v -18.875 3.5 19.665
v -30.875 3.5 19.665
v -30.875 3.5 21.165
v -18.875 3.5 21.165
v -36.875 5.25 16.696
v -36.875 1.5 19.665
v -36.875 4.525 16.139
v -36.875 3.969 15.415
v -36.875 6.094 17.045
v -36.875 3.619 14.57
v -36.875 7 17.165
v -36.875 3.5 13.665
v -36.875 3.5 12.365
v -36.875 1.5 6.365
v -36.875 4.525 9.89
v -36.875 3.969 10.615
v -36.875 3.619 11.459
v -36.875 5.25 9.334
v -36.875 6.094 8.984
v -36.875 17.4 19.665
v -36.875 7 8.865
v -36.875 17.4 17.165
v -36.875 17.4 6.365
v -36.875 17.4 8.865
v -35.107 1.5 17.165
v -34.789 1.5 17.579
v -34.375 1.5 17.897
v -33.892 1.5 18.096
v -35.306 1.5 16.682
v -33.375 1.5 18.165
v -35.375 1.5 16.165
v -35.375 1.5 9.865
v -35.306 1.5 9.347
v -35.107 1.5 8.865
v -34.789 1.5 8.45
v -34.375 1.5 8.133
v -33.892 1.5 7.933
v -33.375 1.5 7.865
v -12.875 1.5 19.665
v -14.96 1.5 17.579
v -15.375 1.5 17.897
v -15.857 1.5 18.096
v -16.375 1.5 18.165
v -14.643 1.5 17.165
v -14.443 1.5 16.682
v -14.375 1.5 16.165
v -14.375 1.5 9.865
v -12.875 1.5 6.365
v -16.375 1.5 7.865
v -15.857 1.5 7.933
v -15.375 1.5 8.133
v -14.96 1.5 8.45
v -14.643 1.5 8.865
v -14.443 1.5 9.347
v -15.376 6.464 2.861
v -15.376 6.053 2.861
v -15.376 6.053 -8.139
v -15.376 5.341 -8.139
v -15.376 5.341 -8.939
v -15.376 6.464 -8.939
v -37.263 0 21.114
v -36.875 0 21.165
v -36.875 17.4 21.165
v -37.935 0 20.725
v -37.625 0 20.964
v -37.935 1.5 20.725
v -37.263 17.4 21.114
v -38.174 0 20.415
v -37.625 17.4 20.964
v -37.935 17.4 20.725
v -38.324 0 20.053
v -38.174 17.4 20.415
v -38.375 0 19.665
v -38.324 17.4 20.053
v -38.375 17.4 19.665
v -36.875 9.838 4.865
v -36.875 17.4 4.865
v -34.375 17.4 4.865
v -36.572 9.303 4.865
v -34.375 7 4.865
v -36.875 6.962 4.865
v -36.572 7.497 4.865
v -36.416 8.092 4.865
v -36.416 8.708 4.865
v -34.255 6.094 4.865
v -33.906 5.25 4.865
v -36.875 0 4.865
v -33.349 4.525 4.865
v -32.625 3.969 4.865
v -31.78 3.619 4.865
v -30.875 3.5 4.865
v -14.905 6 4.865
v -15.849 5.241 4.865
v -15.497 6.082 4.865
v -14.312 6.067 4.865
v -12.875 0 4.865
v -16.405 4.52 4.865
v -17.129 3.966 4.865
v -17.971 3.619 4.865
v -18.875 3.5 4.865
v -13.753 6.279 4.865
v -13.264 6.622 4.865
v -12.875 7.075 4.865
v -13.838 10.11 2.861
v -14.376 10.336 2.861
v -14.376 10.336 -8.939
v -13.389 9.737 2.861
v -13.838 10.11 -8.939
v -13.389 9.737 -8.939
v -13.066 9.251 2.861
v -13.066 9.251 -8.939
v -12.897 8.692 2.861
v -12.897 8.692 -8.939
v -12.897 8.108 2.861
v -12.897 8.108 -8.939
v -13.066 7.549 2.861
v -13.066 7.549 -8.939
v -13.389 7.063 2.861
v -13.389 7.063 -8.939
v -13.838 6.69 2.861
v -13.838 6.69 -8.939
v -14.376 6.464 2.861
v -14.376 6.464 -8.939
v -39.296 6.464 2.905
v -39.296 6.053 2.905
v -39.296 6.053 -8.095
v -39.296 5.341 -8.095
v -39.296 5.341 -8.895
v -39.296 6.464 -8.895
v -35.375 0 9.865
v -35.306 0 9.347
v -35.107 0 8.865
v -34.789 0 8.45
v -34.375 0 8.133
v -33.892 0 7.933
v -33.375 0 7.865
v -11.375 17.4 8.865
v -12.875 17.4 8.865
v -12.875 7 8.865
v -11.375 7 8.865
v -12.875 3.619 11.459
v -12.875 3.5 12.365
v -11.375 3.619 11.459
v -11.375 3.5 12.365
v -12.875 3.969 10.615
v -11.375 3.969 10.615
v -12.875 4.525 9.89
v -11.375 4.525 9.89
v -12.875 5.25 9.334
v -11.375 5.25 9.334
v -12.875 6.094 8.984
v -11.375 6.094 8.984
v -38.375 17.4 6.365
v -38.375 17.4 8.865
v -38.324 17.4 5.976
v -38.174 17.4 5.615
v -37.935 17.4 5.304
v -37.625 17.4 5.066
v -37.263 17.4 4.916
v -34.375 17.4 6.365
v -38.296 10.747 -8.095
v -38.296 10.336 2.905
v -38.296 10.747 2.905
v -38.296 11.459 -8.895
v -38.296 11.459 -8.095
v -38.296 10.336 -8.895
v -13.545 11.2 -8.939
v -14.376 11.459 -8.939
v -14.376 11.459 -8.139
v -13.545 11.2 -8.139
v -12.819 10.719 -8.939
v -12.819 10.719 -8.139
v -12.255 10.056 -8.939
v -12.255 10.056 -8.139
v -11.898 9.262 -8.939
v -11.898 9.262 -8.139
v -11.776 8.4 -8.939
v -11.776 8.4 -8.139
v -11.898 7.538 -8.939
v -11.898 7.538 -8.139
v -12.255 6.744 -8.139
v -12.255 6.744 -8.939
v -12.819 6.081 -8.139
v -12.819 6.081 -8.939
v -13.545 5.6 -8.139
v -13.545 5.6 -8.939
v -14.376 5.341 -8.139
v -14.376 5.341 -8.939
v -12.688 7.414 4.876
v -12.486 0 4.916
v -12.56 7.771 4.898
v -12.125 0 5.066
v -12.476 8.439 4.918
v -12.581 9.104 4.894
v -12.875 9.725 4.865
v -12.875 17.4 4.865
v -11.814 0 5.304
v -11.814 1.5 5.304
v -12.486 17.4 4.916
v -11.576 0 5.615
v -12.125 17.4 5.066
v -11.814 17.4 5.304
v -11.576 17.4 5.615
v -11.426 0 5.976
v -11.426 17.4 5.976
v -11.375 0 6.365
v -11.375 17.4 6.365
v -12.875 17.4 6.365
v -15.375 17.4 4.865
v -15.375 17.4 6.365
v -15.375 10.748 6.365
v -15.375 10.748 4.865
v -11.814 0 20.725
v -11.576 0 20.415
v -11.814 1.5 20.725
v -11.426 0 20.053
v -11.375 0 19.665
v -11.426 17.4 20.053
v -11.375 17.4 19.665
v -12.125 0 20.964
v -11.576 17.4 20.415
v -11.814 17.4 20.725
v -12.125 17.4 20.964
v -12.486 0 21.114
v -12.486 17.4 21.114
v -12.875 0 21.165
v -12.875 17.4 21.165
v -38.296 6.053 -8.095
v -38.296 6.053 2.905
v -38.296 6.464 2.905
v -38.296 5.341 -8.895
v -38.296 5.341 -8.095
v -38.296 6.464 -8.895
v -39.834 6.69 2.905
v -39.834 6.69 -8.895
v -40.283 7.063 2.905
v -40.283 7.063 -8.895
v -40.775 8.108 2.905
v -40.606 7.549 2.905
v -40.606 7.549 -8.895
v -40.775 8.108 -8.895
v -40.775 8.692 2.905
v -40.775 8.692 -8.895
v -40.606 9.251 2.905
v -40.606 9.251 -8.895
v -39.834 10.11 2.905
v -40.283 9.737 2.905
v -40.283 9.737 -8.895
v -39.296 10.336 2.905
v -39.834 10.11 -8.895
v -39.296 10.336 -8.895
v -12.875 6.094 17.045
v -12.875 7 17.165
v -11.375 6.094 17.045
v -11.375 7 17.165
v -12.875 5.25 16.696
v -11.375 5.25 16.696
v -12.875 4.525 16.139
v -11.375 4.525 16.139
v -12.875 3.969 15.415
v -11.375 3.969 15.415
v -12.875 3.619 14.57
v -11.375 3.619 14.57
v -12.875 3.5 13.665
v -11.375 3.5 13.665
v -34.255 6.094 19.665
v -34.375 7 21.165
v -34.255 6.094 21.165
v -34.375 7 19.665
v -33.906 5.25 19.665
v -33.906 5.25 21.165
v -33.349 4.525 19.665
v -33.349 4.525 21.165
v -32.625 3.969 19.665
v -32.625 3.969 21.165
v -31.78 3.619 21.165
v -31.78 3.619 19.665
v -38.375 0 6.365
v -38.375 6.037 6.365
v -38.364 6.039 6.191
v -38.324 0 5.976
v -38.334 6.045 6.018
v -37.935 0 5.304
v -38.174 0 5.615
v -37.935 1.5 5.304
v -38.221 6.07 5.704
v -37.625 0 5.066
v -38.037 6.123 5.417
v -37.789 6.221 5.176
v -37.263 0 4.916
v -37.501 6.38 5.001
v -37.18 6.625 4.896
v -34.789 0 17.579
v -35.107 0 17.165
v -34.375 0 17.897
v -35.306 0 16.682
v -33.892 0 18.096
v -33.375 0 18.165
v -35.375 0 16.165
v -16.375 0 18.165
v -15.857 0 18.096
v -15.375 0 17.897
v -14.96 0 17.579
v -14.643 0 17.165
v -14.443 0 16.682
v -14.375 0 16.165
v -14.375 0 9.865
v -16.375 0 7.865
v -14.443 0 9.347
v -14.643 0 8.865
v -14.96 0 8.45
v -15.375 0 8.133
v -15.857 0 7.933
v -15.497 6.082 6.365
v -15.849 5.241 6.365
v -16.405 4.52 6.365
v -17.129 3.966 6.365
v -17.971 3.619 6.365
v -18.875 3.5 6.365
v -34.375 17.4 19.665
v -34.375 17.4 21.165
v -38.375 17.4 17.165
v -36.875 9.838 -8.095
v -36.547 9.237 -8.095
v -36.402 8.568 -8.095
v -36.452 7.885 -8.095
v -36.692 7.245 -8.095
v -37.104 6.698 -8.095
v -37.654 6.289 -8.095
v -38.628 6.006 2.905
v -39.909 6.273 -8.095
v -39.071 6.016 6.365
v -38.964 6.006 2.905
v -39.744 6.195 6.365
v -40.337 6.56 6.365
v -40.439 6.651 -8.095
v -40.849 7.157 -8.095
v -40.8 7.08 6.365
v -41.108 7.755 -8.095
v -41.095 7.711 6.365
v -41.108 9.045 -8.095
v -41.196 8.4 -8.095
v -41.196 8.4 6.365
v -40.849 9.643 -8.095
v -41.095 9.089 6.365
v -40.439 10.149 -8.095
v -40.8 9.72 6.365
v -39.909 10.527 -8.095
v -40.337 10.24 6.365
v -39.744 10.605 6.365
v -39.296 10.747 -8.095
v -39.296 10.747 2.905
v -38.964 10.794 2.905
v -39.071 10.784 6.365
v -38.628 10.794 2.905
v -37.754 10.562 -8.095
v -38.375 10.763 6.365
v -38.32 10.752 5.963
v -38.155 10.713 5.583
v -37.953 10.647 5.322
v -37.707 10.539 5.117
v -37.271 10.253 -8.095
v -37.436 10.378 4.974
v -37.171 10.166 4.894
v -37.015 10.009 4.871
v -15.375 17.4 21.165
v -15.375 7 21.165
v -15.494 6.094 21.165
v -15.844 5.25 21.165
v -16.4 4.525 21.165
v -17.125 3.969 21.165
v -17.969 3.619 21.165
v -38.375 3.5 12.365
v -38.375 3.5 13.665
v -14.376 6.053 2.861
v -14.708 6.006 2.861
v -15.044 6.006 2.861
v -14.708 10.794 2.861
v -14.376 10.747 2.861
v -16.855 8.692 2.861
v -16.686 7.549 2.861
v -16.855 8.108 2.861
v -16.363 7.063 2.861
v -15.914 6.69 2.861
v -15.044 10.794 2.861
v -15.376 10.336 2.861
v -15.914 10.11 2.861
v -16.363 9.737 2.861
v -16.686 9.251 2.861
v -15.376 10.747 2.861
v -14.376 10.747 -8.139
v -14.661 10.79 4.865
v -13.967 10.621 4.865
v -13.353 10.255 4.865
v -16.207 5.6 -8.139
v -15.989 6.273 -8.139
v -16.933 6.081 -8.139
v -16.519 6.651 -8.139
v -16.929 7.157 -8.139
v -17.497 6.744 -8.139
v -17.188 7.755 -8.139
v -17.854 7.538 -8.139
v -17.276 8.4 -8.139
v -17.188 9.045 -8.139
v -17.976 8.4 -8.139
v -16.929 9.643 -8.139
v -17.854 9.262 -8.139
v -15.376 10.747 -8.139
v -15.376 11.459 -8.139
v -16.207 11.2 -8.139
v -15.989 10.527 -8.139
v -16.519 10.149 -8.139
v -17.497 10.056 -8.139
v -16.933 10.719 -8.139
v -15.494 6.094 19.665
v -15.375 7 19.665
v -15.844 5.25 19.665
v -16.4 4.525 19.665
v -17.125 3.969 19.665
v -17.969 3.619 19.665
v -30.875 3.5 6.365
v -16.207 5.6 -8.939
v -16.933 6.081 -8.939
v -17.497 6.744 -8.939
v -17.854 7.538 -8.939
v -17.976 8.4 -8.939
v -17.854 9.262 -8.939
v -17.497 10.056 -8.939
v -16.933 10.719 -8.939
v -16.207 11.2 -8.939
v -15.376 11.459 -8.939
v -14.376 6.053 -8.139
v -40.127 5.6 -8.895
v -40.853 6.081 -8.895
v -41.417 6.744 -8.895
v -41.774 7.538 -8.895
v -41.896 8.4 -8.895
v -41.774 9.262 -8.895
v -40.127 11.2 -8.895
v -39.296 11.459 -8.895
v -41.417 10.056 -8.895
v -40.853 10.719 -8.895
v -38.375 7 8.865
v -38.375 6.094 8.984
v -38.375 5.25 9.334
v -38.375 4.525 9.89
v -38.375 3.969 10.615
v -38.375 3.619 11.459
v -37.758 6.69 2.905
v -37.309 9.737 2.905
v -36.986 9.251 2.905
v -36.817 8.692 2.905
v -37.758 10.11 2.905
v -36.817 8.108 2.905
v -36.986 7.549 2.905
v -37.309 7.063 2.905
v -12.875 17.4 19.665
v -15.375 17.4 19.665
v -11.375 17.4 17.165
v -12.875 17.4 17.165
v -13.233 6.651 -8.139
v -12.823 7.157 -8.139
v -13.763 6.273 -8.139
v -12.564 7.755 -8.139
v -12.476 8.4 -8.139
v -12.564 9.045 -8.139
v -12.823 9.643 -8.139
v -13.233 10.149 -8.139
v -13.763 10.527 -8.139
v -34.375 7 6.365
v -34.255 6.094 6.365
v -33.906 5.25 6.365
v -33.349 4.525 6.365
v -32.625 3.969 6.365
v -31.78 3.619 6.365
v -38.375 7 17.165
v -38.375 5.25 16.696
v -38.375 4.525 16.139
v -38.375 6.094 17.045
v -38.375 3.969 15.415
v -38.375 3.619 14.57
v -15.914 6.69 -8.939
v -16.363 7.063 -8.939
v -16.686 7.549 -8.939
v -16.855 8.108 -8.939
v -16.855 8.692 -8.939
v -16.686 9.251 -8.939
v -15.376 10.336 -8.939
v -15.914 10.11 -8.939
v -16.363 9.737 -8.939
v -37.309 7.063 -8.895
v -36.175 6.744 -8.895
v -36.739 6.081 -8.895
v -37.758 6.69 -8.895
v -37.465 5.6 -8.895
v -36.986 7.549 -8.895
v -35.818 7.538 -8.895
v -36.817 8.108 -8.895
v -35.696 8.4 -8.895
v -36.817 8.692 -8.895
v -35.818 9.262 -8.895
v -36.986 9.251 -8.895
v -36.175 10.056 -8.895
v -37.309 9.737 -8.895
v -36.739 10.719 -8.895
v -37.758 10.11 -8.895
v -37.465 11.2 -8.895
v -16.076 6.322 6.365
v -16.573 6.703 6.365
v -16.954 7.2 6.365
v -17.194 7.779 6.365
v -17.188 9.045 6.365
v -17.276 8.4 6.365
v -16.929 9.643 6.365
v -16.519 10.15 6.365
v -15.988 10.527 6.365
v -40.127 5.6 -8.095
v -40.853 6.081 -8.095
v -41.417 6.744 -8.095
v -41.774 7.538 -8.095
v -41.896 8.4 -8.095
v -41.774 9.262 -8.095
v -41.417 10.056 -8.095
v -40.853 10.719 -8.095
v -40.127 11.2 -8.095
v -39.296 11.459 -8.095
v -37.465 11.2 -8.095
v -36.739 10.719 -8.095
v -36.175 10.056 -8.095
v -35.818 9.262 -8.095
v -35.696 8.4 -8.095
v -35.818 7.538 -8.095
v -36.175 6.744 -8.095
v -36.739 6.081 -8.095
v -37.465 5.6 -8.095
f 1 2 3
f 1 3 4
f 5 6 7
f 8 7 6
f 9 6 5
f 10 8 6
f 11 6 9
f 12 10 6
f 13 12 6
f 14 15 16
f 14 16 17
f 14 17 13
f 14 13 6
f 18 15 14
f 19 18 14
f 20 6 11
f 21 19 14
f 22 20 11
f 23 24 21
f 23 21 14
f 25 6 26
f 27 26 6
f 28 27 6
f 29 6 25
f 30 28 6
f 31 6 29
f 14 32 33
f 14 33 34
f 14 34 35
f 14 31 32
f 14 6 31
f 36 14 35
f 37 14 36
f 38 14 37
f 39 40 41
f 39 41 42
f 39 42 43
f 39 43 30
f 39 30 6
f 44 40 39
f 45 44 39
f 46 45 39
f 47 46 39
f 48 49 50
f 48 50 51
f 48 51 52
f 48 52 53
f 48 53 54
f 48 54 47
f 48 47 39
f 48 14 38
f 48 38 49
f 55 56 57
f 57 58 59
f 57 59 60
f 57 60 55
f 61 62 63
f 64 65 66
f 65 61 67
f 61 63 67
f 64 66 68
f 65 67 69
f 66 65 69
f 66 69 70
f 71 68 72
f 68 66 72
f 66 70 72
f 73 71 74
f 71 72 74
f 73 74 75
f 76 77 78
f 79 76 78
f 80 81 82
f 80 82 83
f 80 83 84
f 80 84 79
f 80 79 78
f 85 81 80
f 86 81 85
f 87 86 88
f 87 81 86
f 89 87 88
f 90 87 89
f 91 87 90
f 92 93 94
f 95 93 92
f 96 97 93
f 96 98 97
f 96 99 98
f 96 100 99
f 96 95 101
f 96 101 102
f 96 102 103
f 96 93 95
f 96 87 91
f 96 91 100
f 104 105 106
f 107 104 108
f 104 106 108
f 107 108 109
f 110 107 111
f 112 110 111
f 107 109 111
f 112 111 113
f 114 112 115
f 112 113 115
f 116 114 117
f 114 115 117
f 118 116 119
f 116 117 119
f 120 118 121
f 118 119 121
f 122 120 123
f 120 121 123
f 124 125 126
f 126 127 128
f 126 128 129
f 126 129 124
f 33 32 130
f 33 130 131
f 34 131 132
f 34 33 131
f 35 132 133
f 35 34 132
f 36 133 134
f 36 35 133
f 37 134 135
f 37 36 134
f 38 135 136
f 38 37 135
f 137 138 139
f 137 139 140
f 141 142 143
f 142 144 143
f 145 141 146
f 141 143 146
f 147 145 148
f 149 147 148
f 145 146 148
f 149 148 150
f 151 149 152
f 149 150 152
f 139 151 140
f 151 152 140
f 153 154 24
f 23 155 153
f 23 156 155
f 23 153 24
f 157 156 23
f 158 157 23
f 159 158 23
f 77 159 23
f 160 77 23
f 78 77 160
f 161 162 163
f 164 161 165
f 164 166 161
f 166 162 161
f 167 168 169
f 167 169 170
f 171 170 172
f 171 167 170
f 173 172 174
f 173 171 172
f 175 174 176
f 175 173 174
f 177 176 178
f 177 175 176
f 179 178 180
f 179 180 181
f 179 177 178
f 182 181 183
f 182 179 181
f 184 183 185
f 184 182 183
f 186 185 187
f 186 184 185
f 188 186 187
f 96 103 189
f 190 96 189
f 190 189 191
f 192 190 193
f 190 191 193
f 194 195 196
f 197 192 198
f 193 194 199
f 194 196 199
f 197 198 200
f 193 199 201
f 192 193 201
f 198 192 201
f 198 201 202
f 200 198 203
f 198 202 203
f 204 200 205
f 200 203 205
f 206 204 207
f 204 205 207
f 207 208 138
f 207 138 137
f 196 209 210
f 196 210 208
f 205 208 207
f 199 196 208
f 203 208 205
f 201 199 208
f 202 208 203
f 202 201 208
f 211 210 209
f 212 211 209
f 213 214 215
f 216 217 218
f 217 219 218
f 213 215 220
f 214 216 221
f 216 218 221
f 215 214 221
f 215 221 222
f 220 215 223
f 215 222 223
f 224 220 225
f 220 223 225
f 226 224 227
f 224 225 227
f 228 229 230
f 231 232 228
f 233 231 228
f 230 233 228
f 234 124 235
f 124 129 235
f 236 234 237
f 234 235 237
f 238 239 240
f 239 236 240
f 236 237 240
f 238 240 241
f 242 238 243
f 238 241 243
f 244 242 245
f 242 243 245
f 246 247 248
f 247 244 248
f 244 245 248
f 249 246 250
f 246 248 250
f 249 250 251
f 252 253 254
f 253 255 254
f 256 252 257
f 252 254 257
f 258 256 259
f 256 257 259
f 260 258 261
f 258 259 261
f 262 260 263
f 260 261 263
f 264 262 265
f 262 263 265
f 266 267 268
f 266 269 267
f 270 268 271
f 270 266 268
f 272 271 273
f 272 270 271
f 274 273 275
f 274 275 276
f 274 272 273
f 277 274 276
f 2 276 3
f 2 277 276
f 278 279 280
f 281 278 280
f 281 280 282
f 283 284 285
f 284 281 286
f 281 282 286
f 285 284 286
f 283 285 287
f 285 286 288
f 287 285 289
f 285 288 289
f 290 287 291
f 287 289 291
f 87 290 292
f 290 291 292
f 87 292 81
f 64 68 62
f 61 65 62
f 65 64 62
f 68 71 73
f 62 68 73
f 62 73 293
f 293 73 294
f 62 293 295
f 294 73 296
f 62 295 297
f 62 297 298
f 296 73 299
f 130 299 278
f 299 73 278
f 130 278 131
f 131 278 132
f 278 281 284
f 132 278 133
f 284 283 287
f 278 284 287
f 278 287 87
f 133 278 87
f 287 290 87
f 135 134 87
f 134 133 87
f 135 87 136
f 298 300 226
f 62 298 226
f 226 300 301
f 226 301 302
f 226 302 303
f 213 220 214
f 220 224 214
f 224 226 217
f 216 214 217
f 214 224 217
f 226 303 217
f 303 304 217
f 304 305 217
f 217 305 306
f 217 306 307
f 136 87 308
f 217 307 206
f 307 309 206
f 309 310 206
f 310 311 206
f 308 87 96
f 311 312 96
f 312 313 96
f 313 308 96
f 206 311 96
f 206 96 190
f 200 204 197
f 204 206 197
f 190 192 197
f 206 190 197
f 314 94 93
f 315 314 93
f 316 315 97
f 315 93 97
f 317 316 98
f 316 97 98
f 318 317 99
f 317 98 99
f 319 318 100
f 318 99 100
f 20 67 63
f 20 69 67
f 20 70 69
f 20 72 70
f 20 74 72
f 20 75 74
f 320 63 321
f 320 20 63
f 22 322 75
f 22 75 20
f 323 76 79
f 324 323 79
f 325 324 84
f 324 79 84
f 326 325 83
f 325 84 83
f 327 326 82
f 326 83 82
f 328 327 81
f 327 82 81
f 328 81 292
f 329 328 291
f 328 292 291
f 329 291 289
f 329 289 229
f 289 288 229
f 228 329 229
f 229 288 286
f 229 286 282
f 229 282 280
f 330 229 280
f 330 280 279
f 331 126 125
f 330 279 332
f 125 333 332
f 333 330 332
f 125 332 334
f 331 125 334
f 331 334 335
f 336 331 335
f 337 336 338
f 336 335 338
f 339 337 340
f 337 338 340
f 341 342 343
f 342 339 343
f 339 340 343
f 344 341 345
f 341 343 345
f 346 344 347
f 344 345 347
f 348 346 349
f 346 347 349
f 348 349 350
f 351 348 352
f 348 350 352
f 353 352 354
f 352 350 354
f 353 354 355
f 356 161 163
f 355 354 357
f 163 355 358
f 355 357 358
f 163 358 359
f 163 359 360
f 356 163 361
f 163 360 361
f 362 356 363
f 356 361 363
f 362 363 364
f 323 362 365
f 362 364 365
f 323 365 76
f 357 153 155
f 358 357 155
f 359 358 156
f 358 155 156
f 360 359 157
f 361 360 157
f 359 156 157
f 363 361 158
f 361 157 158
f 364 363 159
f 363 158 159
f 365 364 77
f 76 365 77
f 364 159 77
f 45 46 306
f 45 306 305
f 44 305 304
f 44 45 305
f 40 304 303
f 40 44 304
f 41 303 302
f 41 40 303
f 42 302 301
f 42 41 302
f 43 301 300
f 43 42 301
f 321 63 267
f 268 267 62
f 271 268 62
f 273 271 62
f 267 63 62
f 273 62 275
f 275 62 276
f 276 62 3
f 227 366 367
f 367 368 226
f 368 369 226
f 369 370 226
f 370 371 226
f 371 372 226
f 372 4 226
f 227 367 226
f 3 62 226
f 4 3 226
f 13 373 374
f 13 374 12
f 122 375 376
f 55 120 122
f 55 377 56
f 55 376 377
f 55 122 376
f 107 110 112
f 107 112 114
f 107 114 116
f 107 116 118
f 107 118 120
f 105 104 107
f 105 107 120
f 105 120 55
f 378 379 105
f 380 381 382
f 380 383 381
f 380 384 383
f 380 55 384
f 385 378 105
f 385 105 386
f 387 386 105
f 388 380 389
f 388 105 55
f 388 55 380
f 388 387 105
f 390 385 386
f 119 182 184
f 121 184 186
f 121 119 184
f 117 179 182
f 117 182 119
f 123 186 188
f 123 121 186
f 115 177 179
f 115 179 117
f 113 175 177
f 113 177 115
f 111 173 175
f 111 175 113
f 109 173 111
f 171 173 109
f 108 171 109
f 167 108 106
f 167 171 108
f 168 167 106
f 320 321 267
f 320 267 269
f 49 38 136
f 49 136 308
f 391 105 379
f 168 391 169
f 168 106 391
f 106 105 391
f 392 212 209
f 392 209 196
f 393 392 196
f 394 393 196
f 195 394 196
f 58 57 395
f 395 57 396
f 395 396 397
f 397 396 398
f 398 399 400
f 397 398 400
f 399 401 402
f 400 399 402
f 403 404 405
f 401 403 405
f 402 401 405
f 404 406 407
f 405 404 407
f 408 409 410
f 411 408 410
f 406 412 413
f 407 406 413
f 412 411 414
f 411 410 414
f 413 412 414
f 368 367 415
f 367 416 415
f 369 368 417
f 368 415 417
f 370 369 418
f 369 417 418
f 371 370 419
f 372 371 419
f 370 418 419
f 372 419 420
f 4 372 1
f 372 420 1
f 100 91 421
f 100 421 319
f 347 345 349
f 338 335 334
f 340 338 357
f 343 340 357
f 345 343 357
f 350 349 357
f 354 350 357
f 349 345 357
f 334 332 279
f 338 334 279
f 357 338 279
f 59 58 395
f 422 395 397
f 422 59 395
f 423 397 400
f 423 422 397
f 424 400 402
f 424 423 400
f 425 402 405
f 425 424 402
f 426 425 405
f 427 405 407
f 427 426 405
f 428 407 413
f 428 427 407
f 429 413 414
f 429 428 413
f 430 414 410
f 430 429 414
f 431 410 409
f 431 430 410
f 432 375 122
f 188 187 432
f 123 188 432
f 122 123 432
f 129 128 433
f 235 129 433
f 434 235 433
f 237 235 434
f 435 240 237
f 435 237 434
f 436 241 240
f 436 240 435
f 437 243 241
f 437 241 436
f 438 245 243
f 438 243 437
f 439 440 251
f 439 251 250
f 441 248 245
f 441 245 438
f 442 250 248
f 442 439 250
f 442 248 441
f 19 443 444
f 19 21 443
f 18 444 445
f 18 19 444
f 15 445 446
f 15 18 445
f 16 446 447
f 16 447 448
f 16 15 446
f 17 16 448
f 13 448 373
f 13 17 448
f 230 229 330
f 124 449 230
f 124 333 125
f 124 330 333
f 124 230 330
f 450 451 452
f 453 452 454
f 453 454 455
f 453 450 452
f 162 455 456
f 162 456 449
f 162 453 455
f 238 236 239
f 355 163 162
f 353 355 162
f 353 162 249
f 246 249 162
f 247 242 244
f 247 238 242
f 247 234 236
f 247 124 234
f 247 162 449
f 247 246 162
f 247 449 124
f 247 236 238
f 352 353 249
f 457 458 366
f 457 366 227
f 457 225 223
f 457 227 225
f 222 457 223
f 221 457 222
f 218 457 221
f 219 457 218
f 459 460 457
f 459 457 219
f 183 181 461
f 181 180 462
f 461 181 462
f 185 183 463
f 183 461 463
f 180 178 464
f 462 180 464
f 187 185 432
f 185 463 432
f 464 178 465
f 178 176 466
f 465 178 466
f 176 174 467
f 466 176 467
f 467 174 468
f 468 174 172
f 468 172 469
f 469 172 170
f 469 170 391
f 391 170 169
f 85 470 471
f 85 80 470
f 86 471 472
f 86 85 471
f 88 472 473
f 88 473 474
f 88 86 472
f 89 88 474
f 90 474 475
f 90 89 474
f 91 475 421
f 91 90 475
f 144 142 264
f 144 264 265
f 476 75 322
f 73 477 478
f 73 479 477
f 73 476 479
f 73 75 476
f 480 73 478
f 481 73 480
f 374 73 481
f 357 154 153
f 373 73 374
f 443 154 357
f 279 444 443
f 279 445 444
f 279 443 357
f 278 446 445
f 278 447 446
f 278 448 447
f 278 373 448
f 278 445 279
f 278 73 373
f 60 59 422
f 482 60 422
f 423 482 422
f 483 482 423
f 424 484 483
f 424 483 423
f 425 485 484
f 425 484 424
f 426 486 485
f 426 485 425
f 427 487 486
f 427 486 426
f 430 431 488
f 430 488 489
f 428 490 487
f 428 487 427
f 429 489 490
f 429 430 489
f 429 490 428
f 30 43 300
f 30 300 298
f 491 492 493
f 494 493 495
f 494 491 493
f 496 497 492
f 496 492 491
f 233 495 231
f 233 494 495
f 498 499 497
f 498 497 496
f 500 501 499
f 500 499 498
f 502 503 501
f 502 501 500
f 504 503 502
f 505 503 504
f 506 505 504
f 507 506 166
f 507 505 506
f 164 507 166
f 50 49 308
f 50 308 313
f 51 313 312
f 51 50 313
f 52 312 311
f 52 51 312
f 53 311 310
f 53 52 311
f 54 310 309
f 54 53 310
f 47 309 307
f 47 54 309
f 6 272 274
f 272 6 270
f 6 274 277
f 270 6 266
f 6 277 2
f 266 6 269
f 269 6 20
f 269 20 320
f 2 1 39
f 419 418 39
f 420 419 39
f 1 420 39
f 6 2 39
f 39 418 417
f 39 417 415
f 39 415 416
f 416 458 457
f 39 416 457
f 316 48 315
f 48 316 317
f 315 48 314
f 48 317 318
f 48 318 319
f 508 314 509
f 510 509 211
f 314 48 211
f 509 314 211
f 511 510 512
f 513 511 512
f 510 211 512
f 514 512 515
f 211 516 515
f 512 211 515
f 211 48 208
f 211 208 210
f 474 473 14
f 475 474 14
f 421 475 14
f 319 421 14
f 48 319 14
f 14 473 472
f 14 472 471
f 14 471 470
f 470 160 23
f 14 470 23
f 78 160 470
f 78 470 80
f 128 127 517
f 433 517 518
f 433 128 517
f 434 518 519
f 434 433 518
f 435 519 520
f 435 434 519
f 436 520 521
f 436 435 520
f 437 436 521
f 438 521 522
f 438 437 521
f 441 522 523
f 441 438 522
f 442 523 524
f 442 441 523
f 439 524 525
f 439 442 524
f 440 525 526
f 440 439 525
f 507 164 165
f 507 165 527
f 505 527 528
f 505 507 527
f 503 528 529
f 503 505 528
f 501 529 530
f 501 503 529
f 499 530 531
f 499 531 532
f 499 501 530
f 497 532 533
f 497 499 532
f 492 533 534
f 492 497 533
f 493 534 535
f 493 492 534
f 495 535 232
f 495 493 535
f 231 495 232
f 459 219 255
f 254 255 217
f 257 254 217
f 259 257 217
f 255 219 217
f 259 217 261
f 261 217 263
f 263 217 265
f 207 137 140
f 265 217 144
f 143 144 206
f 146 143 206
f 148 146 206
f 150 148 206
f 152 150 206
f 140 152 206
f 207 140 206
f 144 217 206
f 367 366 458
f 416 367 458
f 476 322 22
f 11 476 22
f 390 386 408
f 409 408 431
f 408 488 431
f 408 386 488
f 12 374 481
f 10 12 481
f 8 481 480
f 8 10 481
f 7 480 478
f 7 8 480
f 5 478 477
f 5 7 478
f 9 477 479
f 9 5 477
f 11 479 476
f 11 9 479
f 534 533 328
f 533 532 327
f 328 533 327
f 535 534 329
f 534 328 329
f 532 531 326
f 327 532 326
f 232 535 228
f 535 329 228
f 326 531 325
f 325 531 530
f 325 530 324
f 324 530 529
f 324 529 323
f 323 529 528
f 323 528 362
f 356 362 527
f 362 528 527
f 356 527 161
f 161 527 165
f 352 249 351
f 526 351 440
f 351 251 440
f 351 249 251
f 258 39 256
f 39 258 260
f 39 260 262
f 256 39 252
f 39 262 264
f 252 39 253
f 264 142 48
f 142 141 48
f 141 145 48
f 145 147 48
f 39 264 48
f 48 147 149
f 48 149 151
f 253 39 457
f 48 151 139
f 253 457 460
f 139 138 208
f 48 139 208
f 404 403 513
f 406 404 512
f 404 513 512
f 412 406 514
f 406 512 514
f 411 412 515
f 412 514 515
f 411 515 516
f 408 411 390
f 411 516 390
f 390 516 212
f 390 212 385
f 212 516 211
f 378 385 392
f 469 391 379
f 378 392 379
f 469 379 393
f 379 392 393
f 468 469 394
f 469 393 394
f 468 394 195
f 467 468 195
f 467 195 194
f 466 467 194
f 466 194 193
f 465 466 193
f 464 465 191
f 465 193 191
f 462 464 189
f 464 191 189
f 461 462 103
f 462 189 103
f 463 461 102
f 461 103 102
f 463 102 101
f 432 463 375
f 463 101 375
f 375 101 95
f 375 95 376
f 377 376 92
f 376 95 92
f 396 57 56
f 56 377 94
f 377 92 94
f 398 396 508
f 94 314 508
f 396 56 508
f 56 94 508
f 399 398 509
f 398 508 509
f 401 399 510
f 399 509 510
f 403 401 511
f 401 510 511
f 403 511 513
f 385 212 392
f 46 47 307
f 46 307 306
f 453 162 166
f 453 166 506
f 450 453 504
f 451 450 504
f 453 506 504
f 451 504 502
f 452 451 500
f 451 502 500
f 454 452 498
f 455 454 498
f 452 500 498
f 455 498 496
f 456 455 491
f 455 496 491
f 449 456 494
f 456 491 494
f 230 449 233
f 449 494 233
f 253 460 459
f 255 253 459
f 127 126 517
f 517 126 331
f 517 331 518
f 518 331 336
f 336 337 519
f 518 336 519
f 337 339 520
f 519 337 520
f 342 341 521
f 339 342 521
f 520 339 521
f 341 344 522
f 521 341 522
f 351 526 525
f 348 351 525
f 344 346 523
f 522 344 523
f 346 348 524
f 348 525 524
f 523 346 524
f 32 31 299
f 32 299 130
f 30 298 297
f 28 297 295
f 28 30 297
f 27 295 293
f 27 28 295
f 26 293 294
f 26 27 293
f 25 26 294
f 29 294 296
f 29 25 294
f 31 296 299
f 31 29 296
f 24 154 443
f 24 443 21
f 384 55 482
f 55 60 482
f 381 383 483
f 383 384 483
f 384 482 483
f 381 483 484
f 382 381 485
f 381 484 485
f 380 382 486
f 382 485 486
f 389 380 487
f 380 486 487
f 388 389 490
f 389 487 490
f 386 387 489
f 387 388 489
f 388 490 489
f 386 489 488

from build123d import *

# Parameters (mm, degrees)
SKETCH1_W                = 27
SKETCH1_H                = 16.3
BOSS_EXTRUDE1_DEPTH      = 17.4
SKETCH2_W                = 24
SKETCH2_H                = 13.3
CUT_EXTRUDE1_DEPTH       = 15.9
SKETCH3_W                = 19
SKETCH3_H                = 16.3
CUT_EXTRUDE2_DEPTH       = 13.9
SKETCH4_W                = 27
SKETCH4_H                = 8.3
CUT_EXTRUDE3_DEPTH       = 13.9
SKETCH6_R                = 3.69
BOSS_EXTRUDE2_DEPTH      = 2.38
SKETCH7_R                = 3.1
CUT_EXTRUDE4_DEPTH       = 0.8
SKETCH8_R                = 2.4
CUT_EXTRUDE5_DEPTH       = 4.8
CUT_EXTRUDE7_START       = -0.8
SKETCH9_R                = 3.1
CUT_EXTRUDE7_DEPTH       = 0.8
CUT_EXTRUDE8_DEPTH       = 10
FILLET1_R                = 3.5
FILLET2_R                = 3.5
FILLET3_R                = 3.5
FILLET4_R                = 3.5
FILLET5_R                = 3.5
FILLET6_R                = 3.5
FILLET7_R                = 3.5
FILLET8_R                = 3.5
FILLET9_R                = 1.5
FILLET10_R               = 1.5
FILLET11_R               = 1.5
FILLET12_R               = 1.5
SKETCH11_W               = 20
SKETCH11_H               = 4.569127273
CUT_EXTRUDE10_DEPTH      = 35
SKETCH12_W               = 26.121320344
SKETCH12_H               = 15.421320343
BOSS_EXTRUDE3_DEPTH      = 1.5
BOSS_EXTRUDE4_DEPTH      = 13.76
BOSS_EXTRUDE4_DEPTH_BACK = 1.5
SKETCH14_R               = 2.4
SKETCH15_R               = 3.1
BOSS_EXTRUDE6_DEPTH      = 0.8
SKETCH17_R               = 2
CUT_EXTRUDE11_DEPTH      = 11.8
SKETCH18_W               = 1
SKETCH18_H               = 8
CUT_EXTRUDE12_DEPTH      = 11.8
BOSS_EXTRUDE7_DEPTH      = 13.803772877
BOSS_EXTRUDE7_DEPTH_BACK = 1.5
SKETCH19_R               = 2.4
SKETCH20_R               = 3.1
BOSS_EXTRUDE8_DEPTH      = 0.8
SKETCH21_R               = 2
CUT_EXTRUDE13_DEPTH      = 11.8
SKETCH22_W               = 1
SKETCH22_H               = 7.748272369
CUT_EXTRUDE14_DEPTH      = 11.8
CUT_EXTRUDE15_DEPTH      = 11.8


with BuildPart() as part:
    # Sketch1 → Boss-Extrude1 (new body)
    with BuildSketch(Plane(origin=(0, 0, 0), x_dir=(1, 0, 0), z_dir=(0, 1, 0))):
        with Locations((-24.874612789, -13.014611924)):
            Rectangle(SKETCH1_W, SKETCH1_H)
    extrude(amount=BOSS_EXTRUDE1_DEPTH)

    # Sketch2 → Cut-Extrude1 (cut)
    with BuildSketch(Plane(origin=(0, 17.4, 0), x_dir=(1, 0, 0), z_dir=(0, 1, 0))):
        with Locations((-24.874612789, -13.014611924)):
            Rectangle(SKETCH2_W, SKETCH2_H)
    extrude(amount=-CUT_EXTRUDE1_DEPTH, mode=Mode.SUBTRACT)

    # Sketch3 → Cut-Extrude2 (cut)
    with BuildSketch(Plane(origin=(0, 17.4, 0), x_dir=(1, 0, 0), z_dir=(0, 1, 0))):
        with Locations((-24.874612789, -13.014611924)):
            Rectangle(SKETCH3_W, SKETCH3_H)
    extrude(amount=-CUT_EXTRUDE2_DEPTH, mode=Mode.SUBTRACT)

    # Sketch4 → Cut-Extrude3 (cut)
    with BuildSketch(Plane(origin=(0, 17.4, 0), x_dir=(1, 0, 0), z_dir=(0, 1, 0))):
        with Locations((-24.874612789, -13.014611924)):
            Rectangle(SKETCH4_W, SKETCH4_H)
    extrude(amount=-CUT_EXTRUDE3_DEPTH, mode=Mode.SUBTRACT)

    # Sketch6 → Boss-Extrude2 (add)
    with BuildSketch(Plane(origin=(0, 0, 0), x_dir=(-1, 0, 0), z_dir=(0, -1, 0))):
        with Locations(Location((32.844612789, -9.029611924, 0), (0, 0, 90))):
            Circle(SKETCH6_R)
        with Locations(Location((32.844612789, -16.999611924, 0), (0, 0, 90))):
            Circle(SKETCH6_R)
        with Locations(Location((16.904612789, -9.029611924, 0), (0, 0, 90))):
            Circle(SKETCH6_R)
        with Locations(Location((16.904612789, -16.999611924, 0), (0, 0, 90))):
            Circle(SKETCH6_R)
    extrude(amount=BOSS_EXTRUDE2_DEPTH)

    # Sketch7 → Cut-Extrude4 (cut)
    with BuildSketch(Plane(origin=(0, -2.38, 0), x_dir=(-1, 0, 0), z_dir=(0, -1, 0))):
        with Locations(Location((32.844612789, -9.029611924, 0), (0, 0, 90))):
            Circle(SKETCH7_R)
        with Locations(Location((32.844612789, -16.999611924, 0), (0, 0, 90))):
            Circle(SKETCH7_R)
        with Locations(Location((16.904612789, -16.999611924, 0), (0, 0, 90))):
            Circle(SKETCH7_R)
        with Locations(Location((16.904612789, -9.029611924, 0), (0, 0, 90))):
            Circle(SKETCH7_R)
    extrude(amount=-CUT_EXTRUDE4_DEPTH, mode=Mode.SUBTRACT)

    # Sketch8 → Cut-Extrude5 (cut)
    with BuildSketch(Plane(origin=(0, -1.58, 0), x_dir=(-1, 0, 0), z_dir=(0, -1, 0))):
        with Locations(Location((32.844612789, -9.029611924, 0), (0, 0, 90))):
            Circle(SKETCH8_R)
        with Locations(Location((32.844612789, -16.999611924, 0), (0, 0, 90))):
            Circle(SKETCH8_R)
        with Locations(Location((16.904612789, -16.999611924, 0), (0, 0, 90))):
            Circle(SKETCH8_R)
        with Locations(Location((16.904612789, -9.029611924, 0), (0, 0, 90))):
            Circle(SKETCH8_R)
    extrude(amount=-CUT_EXTRUDE5_DEPTH, mode=Mode.SUBTRACT)

    # Sketch9 → Cut-Extrude7 (cut)
    with BuildSketch(Plane(origin=(0, 1.5, 0), x_dir=(1, 0, 0), z_dir=(0, 1, 0)).offset(CUT_EXTRUDE7_START)):
        with Locations(Location((-16.904612789, -16.999611924, 0), (0, 0, 90))):
            Circle(SKETCH9_R)
        with Locations(Location((-16.904612789, -9.029611924, 0), (0, 0, 90))):
            Circle(SKETCH9_R)
        with Locations(Location((-32.844612789, -9.029611924, 0), (0, 0, 90))):
            Circle(SKETCH9_R)
        with Locations(Location((-32.844612789, -16.999611924, 0), (0, 0, 90))):
            Circle(SKETCH9_R)
    extrude(amount=CUT_EXTRUDE7_DEPTH, mode=Mode.SUBTRACT)

    # Sketch10 → Cut-Extrude8 (cut)
    with BuildSketch(Plane(origin=(0, 1.5, 0), x_dir=(1, 0, 0), z_dir=(0, 1, 0))):
        with BuildLine():
            Line((-22.404612789, -7.864611924), (-27.344612789, -7.864611924))
            ThreePointArc((-27.344612789, -7.864611924), (-28.405272961, -8.303951753), (-28.844612789, -9.364611924))
            Line((-28.844612789, -9.364611924), (-28.844612789, -16.664611924))
            ThreePointArc((-28.844612789, -16.664611924), (-28.405272961, -17.725272096), (-27.344612789, -18.164611924))
            Line((-27.344612789, -18.164611924), (-22.404612789, -18.164611924))
            ThreePointArc((-22.404612789, -18.164611924), (-21.343952617, -17.725272096), (-20.904612789, -16.664611924))
            Line((-20.904612789, -16.664611924), (-20.904612789, -9.364611924))
            ThreePointArc((-20.904612789, -9.364611924), (-21.343952617, -8.303951753), (-22.404612789, -7.864611924))
        make_face()
    extrude(amount=-CUT_EXTRUDE8_DEPTH, mode=Mode.SUBTRACT)

    # Fillet1
    fillet1_edges = [part.edges().sort_by_distance(p)[0] for p in [
        (-15.374612789, 3.5, 5.614611924),
    ]]
    fillet(fillet1_edges, radius=FILLET1_R)

    # Fillet2
    fillet2_edges = [part.edges().sort_by_distance(p)[0] for p in [
        (-15.374612789, 3.5, 20.414611924),
    ]]
    fillet(fillet2_edges, radius=FILLET2_R)

    # Fillet3
    fillet3_edges = [part.edges().sort_by_distance(p)[0] for p in [
        (-12.124612789, 3.5, 17.164611924),
    ]]
    fillet(fillet3_edges, radius=FILLET3_R)

    # Fillet4
    fillet4_edges = [part.edges().sort_by_distance(p)[0] for p in [
        (-12.124612789, 3.5, 8.864611924),
    ]]
    fillet(fillet4_edges, radius=FILLET4_R)

    # Fillet5
    fillet5_edges = [part.edges().sort_by_distance(p)[0] for p in [
        (-37.624612789, 3.5, 8.864611924),
    ]]
    fillet(fillet5_edges, radius=FILLET5_R)

    # Fillet6
    fillet6_edges = [part.edges().sort_by_distance(p)[0] for p in [
        (-37.624612789, 3.5, 17.164611924),
    ]]
    fillet(fillet6_edges, radius=FILLET6_R)

    # Fillet7
    fillet7_edges = [part.edges().sort_by_distance(p)[0] for p in [
        (-34.374612789, 3.5, 5.614611924),
    ]]
    fillet(fillet7_edges, radius=FILLET7_R)

    # Fillet8
    fillet8_edges = [part.edges().sort_by_distance(p)[0] for p in [
        (-34.374612789, 3.5, 20.414611924),
    ]]
    fillet(fillet8_edges, radius=FILLET8_R)

    # Fillet9
    fillet9_edges = [part.edges().sort_by_distance(p)[0] for p in [
        (-38.374612789, 8.7, 21.164611924),
    ]]
    fillet(fillet9_edges, radius=FILLET9_R)

    # Fillet10
    fillet10_edges = [part.edges().sort_by_distance(p)[0] for p in [
        (-38.374612789, 8.7, 4.864611924),
    ]]
    fillet(fillet10_edges, radius=FILLET10_R)

    # Fillet11
    fillet11_edges = [part.edges().sort_by_distance(p)[0] for p in [
        (-11.374612789, 8.7, 4.864611924),
    ]]
    fillet(fillet11_edges, radius=FILLET11_R)

    # Fillet12
    fillet12_edges = [part.edges().sort_by_distance(p)[0] for p in [
        (-11.374612789, 8.7, 21.164611924),
    ]]
    fillet(fillet12_edges, radius=FILLET12_R)

    # Sketch11 → Cut-Extrude10 (cut)
    with BuildSketch(Plane(origin=(-11.374612789, 0, 0), x_dir=(0, 0, -1), z_dir=(1, 0, 0))):
        with Locations((-11.164611924, -2.284563637)):
            Rectangle(SKETCH11_W, SKETCH11_H)
    extrude(amount=-CUT_EXTRUDE10_DEPTH, mode=Mode.SUBTRACT)

    # Sketch12 → Boss-Extrude3 (add)
    with BuildSketch(Plane(origin=(0, 0, 0), x_dir=(-1, 0, 0), z_dir=(0, -1, 0))):
        with Locations((24.874612789, -13.014611925)):
            Rectangle(SKETCH12_W, SKETCH12_H)
    extrude(amount=-BOSS_EXTRUDE3_DEPTH)

    # Sketch14 → Boss-Extrude4 (add, two sides: drawn at the far end of the back side and taken through both)
    with BuildSketch(Plane(origin=(-4.421362725, 0, 4.864611924), x_dir=(-1, 0, 0), z_dir=(0, 0, -1)).offset(-BOSS_EXTRUDE4_DEPTH_BACK)):
        with Locations(Location((34.374612789, 8.4, 0), (0, 0, 143.184357726))):
            Circle(SKETCH14_R)
    extrude(amount=BOSS_EXTRUDE4_DEPTH + BOSS_EXTRUDE4_DEPTH_BACK)

    # Sketch15 → Boss-Extrude6 (add)
    with BuildSketch(Plane(origin=(-4.421362725, 0, -8.895388076), x_dir=(-1, 0, 0), z_dir=(0, 0, -1))):
        with Locations((34.374612789, 8.4)):
            Circle(SKETCH15_R)
    extrude(amount=-BOSS_EXTRUDE6_DEPTH)

    # Sketch17 → Cut-Extrude11 (cut)
    with BuildSketch(Plane(origin=(-4.421362725, 0, -8.895388076), x_dir=(-1, 0, 0), z_dir=(0, 0, -1))):
        with Locations((34.374612789, 8.4)):
            Circle(SKETCH17_R)
    extrude(amount=-CUT_EXTRUDE11_DEPTH, mode=Mode.SUBTRACT)

    # Sketch18 → Cut-Extrude12 (cut)
    with BuildSketch(Plane(origin=(-4.421362725, 0, -8.895388076), x_dir=(-1, 0, 0), z_dir=(0, 0, -1))):
        with Locations((34.374612789, 8.4)):
            Rectangle(SKETCH18_W, SKETCH18_H)
    extrude(amount=-CUT_EXTRUDE12_DEPTH, mode=Mode.SUBTRACT)

    # Sketch19 → Boss-Extrude7 (add, two sides: drawn at the far end of the back side and taken through both)
    with BuildSketch(Plane(origin=(0, 0, 4.864611924), x_dir=(-1, 0, 0), z_dir=(0, 0, -1)).offset(-BOSS_EXTRUDE7_DEPTH_BACK)):
        with Locations((14.875975514, 8.4)):
            Circle(SKETCH19_R)
    extrude(amount=BOSS_EXTRUDE7_DEPTH + BOSS_EXTRUDE7_DEPTH_BACK)

    # Sketch20 → Boss-Extrude8 (add)
    with BuildSketch(Plane(origin=(0, 0, -8.939160952), x_dir=(-1, 0, 0), z_dir=(0, 0, -1))):
        with Locations((14.875975514, 8.4)):
            Circle(SKETCH20_R)
    extrude(amount=-BOSS_EXTRUDE8_DEPTH)

    # Sketch21 → Cut-Extrude13 (cut)
    with BuildSketch(Plane(origin=(0, 0, -8.939160952), x_dir=(-1, 0, 0), z_dir=(0, 0, -1))):
        with Locations((14.875975514, 8.4)):
            Circle(SKETCH21_R)
    extrude(amount=-CUT_EXTRUDE13_DEPTH, mode=Mode.SUBTRACT)

    # Sketch22 → Cut-Extrude14 (cut)
    with BuildSketch(Plane(origin=(0, 0, -8.939160952), x_dir=(-1, 0, 0), z_dir=(0, 0, -1))):
        with Locations((14.875975514, 8.525863815)):
            Rectangle(SKETCH22_W, SKETCH22_H)
    extrude(amount=-CUT_EXTRUDE14_DEPTH, mode=Mode.SUBTRACT)

    # Sketch23 → Cut-Extrude15 (cut)
    with BuildSketch(Plane(origin=(0, 1.5, 0), x_dir=(1, 0, 0), z_dir=(0, 1, 0))):
        with BuildLine():
            Line((-33.374612789, -7.864611924), (-16.374612789, -7.864611924))
            ThreePointArc((-16.374612789, -7.864611924), (-14.960399227, -8.450398362), (-14.374612789, -9.864611924))
            Line((-14.374612789, -9.864611924), (-14.374612789, -16.164611924))
            ThreePointArc((-14.374612789, -16.164611924), (-14.960399227, -17.578825487), (-16.374612789, -18.164611924))
            Line((-16.374612789, -18.164611924), (-33.374612789, -18.164611924))
            ThreePointArc((-33.374612789, -18.164611924), (-34.788826352, -17.578825487), (-35.374612789, -16.164611924))
            Line((-35.374612789, -16.164611924), (-35.374612789, -9.864611924))
            ThreePointArc((-35.374612789, -9.864611924), (-34.788826352, -8.450398362), (-33.374612789, -7.864611924))
        make_face()
    extrude(amount=-CUT_EXTRUDE15_DEPTH, mode=Mode.SUBTRACT)


solid = part.part
